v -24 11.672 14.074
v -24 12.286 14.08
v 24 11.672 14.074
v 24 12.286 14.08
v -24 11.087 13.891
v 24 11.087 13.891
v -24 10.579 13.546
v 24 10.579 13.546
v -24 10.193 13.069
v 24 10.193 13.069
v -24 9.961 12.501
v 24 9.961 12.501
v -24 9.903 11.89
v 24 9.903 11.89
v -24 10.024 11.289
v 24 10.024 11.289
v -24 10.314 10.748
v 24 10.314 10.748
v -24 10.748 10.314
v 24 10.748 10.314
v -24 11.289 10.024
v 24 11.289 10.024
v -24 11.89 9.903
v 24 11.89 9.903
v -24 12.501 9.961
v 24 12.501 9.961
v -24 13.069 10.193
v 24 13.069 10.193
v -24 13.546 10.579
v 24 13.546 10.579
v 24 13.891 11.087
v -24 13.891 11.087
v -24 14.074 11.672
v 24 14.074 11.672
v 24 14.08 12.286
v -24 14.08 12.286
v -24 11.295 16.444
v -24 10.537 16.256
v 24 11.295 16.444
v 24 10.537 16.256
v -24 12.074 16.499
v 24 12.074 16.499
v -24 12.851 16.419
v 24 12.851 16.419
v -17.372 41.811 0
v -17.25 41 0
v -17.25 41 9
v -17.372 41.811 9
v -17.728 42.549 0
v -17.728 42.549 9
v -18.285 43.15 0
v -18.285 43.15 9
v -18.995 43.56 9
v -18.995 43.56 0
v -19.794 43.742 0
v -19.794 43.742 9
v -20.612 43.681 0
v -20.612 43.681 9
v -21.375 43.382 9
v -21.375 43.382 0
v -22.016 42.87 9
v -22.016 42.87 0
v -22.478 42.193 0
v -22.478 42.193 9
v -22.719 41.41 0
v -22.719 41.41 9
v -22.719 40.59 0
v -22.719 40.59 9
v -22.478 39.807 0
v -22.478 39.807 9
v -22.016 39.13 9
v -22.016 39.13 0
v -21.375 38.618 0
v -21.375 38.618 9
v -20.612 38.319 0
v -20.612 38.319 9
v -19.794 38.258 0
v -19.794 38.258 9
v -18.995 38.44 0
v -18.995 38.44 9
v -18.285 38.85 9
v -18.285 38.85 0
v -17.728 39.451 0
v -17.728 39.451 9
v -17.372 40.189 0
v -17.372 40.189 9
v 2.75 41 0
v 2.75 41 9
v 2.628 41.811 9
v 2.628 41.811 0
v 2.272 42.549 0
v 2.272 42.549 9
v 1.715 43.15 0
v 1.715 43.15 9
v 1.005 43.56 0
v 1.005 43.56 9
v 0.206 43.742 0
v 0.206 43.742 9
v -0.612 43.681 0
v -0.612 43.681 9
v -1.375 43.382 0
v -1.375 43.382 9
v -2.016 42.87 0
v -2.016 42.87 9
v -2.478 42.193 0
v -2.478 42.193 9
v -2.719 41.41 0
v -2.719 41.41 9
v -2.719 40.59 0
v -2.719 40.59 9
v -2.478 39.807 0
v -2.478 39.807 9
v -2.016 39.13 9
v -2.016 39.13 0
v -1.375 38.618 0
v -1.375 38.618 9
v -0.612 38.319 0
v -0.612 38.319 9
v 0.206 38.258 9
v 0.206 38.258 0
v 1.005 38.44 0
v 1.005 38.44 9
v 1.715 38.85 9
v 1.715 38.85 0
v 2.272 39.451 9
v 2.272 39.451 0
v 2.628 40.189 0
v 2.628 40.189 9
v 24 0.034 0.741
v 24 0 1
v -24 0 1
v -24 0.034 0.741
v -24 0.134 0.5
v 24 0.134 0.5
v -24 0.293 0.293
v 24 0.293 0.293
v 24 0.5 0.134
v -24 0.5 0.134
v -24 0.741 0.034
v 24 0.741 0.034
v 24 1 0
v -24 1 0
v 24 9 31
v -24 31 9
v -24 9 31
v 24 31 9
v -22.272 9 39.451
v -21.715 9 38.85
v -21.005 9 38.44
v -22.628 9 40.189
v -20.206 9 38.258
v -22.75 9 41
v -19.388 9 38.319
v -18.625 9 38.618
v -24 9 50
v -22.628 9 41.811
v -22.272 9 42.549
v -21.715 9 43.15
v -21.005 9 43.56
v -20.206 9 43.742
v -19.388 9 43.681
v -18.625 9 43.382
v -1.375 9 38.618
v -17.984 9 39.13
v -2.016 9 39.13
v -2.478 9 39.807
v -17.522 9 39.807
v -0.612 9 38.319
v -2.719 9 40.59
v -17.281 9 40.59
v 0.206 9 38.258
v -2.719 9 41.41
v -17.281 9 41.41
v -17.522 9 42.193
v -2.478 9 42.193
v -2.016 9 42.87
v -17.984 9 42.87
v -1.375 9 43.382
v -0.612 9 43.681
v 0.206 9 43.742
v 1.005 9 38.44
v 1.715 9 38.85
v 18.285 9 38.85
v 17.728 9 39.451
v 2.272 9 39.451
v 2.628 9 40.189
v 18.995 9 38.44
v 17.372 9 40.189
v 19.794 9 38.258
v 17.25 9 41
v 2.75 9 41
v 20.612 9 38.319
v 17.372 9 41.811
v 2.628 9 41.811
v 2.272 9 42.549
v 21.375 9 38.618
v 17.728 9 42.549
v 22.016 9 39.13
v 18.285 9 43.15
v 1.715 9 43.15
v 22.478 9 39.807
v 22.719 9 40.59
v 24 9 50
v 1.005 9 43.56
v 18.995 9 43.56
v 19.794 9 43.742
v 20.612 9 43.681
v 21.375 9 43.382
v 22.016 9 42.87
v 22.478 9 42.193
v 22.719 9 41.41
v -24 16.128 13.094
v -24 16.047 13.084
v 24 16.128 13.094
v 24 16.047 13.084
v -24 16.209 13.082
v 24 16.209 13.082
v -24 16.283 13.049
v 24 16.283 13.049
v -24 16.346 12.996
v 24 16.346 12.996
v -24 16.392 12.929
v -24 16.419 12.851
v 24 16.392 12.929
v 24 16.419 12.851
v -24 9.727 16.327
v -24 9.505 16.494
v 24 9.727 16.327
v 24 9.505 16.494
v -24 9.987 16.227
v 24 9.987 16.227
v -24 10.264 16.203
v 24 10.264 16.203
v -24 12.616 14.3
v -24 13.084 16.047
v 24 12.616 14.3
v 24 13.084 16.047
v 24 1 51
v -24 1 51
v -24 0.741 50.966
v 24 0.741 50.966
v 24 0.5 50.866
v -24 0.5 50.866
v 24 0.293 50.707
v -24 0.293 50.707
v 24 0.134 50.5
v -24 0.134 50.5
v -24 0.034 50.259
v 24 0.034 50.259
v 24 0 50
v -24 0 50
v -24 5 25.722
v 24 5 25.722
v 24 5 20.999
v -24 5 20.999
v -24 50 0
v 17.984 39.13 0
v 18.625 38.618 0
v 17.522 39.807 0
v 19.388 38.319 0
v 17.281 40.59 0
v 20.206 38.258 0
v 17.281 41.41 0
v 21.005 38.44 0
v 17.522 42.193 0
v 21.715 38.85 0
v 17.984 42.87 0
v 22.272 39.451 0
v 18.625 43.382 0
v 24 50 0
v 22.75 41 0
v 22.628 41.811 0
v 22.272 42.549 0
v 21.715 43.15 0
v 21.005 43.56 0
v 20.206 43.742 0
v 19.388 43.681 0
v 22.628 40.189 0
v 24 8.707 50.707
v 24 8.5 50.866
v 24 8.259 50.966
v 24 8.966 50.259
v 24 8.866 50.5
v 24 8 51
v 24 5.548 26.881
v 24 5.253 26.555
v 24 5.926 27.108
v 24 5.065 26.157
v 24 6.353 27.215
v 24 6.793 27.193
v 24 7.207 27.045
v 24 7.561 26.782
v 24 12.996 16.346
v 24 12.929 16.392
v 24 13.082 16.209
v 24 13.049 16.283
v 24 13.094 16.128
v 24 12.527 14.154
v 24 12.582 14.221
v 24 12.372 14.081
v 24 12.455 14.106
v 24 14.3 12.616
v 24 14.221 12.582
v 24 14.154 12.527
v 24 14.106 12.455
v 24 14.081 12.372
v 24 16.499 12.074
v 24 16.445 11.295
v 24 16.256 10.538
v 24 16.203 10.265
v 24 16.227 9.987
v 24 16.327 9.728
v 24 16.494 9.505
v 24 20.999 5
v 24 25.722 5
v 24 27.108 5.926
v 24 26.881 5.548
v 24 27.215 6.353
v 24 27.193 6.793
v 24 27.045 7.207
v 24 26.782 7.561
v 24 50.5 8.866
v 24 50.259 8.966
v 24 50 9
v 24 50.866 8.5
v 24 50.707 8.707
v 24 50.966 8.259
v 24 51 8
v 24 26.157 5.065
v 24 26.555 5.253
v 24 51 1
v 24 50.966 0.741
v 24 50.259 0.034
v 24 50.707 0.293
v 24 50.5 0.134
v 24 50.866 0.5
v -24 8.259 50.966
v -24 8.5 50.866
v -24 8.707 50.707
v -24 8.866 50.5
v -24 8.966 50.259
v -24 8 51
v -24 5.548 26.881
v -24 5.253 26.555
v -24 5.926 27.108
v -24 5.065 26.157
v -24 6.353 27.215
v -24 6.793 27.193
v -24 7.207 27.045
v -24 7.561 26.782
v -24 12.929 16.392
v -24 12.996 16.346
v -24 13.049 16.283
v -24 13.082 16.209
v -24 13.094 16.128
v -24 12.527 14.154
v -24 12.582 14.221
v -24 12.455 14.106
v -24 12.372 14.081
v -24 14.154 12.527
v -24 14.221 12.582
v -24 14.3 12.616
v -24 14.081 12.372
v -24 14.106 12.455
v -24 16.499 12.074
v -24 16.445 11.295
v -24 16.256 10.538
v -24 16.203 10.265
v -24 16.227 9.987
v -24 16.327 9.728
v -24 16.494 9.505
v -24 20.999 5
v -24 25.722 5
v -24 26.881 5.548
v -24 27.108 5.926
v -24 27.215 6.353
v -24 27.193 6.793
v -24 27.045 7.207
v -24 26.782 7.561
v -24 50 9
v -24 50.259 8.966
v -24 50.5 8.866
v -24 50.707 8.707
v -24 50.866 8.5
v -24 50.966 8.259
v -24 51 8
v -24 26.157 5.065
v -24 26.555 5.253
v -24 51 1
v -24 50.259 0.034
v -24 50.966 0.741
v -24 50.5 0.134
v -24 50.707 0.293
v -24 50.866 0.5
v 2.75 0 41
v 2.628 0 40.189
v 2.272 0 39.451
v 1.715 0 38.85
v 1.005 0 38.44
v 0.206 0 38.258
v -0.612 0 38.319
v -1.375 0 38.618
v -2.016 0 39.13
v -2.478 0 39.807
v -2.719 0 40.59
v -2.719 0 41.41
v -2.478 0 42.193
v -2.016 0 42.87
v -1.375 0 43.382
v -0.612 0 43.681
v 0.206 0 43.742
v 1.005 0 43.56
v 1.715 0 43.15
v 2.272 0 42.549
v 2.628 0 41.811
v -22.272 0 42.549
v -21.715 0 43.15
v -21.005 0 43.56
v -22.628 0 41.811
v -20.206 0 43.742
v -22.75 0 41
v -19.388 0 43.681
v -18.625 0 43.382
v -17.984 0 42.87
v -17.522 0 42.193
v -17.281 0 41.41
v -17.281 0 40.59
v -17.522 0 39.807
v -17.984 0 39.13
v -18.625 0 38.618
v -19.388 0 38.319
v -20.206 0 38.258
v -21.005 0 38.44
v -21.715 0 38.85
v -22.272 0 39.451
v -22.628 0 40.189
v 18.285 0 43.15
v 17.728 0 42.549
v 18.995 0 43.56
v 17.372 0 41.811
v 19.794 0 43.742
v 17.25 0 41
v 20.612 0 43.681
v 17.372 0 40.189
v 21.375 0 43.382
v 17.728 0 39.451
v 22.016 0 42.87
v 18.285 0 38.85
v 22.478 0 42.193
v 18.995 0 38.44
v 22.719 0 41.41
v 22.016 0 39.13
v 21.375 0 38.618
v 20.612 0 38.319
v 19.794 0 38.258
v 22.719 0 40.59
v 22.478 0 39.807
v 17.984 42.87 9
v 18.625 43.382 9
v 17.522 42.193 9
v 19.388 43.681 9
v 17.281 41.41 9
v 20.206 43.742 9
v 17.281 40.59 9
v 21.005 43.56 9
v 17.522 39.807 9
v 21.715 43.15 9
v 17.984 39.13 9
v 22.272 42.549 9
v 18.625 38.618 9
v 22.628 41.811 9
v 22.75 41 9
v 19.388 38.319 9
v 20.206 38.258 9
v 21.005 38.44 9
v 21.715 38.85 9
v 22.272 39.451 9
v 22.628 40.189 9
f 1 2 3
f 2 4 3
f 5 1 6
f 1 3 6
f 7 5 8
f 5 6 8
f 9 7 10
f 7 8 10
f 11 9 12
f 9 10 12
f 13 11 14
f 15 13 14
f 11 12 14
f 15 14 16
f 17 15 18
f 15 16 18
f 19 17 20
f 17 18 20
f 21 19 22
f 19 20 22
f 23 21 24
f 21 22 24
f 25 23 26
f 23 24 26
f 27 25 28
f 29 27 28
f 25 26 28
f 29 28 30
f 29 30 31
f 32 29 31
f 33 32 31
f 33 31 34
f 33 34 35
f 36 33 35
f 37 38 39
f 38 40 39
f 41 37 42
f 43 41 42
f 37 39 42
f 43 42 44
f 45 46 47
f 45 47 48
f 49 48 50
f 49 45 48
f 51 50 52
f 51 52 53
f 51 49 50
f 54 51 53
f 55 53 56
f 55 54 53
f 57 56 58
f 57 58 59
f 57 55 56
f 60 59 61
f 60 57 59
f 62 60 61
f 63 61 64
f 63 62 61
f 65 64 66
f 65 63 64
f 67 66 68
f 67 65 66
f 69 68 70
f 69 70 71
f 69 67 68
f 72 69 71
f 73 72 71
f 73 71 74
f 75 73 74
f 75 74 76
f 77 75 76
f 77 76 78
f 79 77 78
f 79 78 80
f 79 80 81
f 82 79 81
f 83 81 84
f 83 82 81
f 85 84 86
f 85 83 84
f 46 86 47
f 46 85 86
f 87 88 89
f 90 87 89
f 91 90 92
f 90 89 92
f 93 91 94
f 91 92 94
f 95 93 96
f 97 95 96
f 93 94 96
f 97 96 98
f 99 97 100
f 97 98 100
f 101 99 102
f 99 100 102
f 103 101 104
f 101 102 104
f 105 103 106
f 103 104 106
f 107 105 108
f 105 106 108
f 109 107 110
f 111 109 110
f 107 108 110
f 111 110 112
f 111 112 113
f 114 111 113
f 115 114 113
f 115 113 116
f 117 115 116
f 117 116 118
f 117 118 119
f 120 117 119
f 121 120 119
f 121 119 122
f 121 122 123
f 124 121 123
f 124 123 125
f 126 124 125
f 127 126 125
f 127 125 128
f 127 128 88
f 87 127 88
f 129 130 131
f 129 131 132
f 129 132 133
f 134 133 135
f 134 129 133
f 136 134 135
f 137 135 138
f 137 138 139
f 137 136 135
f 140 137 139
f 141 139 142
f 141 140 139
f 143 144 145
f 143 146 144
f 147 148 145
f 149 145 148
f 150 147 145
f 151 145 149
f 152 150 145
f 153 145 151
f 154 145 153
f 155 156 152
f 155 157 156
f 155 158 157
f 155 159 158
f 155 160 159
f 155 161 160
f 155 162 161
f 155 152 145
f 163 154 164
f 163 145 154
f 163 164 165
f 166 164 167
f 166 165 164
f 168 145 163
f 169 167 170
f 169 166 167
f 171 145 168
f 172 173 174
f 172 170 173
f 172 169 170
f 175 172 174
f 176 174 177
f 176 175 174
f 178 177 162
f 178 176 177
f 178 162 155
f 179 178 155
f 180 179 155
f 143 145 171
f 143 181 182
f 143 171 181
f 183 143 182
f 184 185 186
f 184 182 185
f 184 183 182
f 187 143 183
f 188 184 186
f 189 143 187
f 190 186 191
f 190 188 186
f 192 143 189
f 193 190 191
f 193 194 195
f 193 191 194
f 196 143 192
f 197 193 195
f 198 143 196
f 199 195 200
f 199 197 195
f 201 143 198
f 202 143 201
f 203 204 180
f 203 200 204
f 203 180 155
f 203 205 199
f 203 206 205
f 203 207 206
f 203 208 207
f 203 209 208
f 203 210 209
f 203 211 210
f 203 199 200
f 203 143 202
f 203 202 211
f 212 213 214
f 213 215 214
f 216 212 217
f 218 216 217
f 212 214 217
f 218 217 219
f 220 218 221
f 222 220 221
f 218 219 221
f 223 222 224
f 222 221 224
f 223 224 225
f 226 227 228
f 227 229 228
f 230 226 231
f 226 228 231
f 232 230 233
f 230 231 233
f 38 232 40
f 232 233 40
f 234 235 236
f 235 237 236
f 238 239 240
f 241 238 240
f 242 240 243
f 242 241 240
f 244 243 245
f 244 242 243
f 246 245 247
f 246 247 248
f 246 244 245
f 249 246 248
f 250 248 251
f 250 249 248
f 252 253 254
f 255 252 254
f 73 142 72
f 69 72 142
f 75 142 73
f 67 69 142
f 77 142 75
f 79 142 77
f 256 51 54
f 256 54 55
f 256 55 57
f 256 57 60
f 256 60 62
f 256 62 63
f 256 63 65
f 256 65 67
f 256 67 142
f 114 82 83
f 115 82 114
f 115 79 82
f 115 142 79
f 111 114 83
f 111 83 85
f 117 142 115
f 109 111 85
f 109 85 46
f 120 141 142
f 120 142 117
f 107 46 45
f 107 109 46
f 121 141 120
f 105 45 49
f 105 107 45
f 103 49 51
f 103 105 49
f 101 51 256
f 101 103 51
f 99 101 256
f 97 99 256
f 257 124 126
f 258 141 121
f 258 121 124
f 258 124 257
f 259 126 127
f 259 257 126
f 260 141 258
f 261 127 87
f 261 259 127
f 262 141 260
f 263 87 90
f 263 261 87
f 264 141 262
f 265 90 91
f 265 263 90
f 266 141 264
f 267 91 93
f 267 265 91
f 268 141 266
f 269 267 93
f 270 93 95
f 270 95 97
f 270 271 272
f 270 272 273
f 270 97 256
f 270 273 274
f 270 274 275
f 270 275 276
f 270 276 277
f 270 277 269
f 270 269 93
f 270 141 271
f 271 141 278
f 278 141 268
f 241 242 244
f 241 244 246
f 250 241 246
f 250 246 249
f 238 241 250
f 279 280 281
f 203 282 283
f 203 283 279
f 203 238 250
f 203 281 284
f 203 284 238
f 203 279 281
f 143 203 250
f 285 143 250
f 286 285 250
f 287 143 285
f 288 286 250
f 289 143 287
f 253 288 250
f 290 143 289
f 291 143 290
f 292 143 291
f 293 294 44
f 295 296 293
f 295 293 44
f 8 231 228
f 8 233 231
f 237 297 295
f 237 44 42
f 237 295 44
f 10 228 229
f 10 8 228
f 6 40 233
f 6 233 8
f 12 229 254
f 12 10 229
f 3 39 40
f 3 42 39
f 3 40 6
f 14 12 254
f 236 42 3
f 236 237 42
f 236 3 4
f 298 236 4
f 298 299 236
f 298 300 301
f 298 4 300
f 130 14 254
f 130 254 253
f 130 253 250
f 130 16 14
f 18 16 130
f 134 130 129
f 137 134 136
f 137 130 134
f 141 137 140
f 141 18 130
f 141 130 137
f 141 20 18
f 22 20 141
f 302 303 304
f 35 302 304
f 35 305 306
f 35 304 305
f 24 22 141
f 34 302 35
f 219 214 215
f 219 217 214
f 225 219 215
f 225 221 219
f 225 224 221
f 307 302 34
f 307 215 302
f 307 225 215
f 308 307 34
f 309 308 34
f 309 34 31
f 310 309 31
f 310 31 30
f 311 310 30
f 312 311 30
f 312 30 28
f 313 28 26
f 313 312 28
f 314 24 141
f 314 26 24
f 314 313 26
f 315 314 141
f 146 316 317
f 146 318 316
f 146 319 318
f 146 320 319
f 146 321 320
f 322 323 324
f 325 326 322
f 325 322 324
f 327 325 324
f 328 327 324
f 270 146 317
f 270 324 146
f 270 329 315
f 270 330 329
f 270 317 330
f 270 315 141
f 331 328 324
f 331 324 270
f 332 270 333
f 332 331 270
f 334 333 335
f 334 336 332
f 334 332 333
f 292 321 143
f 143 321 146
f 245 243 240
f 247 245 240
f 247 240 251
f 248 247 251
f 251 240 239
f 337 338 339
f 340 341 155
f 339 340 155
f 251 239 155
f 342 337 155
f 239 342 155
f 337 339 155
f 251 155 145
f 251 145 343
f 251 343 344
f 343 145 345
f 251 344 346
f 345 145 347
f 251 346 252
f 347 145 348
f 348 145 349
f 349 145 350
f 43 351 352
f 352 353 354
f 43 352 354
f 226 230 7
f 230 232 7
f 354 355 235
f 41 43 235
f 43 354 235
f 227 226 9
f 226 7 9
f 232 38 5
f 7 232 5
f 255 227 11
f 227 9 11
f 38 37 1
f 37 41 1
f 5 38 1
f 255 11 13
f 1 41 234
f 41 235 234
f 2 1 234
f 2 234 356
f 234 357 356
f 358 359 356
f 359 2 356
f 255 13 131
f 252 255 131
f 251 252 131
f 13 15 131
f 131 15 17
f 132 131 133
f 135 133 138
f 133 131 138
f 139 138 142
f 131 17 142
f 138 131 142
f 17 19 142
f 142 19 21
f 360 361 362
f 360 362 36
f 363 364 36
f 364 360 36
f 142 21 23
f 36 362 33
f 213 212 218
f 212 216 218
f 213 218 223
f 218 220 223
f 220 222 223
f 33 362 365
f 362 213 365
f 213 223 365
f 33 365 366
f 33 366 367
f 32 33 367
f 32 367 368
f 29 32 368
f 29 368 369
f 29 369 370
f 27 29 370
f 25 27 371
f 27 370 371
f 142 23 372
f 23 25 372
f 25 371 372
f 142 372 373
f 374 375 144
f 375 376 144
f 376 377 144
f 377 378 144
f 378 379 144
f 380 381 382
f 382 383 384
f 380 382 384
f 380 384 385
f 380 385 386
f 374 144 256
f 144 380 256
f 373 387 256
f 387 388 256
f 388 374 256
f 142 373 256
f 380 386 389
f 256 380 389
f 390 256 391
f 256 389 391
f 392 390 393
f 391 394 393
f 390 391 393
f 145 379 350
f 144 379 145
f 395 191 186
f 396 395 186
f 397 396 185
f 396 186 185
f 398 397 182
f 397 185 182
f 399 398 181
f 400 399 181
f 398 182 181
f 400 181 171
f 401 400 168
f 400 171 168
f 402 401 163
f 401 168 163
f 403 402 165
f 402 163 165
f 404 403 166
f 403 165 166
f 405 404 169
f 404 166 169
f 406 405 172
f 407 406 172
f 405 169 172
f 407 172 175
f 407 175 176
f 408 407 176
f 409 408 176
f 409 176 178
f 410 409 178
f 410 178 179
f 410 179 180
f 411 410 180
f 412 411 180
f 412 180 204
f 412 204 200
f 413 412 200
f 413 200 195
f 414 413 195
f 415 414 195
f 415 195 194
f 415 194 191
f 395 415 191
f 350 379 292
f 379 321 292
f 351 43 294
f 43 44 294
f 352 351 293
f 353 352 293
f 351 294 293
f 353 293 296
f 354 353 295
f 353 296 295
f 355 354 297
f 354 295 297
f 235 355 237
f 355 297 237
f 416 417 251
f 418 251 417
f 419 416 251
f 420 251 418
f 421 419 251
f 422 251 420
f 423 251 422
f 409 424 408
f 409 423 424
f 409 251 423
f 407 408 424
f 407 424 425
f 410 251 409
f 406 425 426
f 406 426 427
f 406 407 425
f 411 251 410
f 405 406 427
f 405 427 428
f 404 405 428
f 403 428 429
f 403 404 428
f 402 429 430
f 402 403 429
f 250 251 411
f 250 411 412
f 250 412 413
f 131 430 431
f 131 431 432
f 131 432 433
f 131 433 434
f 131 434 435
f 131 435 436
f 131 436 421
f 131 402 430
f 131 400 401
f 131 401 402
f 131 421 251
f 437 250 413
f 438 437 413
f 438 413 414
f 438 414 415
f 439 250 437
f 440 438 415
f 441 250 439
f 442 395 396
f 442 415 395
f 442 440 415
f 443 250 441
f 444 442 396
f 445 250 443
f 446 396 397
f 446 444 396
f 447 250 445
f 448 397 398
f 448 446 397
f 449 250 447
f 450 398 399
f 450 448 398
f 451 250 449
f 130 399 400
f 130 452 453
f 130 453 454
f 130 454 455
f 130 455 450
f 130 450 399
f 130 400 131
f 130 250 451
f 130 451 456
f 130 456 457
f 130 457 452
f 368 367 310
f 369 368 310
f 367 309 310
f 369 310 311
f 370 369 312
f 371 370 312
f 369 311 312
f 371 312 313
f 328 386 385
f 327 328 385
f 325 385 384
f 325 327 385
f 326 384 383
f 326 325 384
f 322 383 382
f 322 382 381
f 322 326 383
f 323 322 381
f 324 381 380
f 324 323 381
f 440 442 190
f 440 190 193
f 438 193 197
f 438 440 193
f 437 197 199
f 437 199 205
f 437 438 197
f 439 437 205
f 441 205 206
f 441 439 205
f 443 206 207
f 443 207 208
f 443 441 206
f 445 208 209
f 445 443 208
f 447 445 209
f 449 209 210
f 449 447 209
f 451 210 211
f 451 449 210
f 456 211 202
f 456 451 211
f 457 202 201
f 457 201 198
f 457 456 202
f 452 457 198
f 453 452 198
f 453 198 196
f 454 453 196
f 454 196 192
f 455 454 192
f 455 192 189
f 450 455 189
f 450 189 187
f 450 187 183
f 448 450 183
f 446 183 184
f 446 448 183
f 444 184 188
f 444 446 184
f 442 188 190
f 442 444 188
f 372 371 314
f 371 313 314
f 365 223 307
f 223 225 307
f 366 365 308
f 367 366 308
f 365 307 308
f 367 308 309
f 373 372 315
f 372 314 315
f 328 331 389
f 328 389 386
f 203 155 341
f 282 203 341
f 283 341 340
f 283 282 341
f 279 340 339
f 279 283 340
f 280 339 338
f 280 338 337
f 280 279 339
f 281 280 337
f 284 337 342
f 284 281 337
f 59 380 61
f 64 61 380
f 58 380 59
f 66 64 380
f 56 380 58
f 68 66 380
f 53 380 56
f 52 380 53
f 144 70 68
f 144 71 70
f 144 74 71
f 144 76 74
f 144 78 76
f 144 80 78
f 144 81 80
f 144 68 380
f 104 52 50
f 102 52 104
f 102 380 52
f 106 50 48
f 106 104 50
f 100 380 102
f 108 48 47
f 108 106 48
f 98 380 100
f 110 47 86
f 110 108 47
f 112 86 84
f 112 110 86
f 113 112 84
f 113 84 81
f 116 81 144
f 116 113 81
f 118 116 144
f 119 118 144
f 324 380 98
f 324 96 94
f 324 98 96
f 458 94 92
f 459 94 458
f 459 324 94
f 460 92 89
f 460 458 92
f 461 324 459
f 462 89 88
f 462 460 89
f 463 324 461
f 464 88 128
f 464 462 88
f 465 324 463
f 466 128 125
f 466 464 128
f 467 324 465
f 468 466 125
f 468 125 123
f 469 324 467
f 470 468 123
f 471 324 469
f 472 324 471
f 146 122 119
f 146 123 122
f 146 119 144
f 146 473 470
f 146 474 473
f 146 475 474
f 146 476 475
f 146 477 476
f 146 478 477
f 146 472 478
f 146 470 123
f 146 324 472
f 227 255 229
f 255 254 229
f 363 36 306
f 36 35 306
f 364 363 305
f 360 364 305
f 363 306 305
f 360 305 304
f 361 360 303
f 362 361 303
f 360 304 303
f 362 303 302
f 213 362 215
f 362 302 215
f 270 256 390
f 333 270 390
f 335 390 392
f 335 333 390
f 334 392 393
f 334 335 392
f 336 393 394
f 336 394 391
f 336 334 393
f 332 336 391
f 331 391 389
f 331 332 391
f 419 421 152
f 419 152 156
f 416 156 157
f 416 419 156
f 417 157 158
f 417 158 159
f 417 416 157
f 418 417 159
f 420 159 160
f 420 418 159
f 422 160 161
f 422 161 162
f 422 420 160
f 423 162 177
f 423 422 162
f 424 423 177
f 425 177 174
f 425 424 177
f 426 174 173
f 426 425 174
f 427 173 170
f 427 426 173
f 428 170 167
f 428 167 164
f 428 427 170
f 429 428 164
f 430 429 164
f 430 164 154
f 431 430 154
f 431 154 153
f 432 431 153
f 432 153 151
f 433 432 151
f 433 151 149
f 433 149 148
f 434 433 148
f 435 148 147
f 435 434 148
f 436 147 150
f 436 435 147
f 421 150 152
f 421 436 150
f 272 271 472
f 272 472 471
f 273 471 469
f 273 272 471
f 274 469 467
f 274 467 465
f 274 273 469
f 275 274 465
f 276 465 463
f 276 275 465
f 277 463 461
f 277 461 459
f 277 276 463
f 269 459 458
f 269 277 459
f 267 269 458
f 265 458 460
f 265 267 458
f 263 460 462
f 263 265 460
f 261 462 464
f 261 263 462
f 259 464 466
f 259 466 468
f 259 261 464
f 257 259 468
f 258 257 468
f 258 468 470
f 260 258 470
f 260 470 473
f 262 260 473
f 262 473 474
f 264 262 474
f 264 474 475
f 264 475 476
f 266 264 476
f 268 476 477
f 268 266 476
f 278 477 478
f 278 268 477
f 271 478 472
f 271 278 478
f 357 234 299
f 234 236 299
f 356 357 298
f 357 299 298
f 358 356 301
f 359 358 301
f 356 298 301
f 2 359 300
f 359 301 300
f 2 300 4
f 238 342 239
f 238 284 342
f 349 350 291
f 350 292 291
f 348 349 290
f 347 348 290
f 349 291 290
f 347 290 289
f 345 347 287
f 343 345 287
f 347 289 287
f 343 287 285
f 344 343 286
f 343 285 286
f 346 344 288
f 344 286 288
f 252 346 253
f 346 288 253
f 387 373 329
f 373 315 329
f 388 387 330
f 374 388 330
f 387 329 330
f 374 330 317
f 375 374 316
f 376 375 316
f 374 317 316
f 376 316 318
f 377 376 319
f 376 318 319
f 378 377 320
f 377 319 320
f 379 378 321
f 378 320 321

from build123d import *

# Parameters (mm, degrees)
BOSS_EXTRUDE1_DEPTH      = 24
BOSS_EXTRUDE1_DEPTH_BACK = 24
SKETCH2_R                = 2.75
CUT_EXTRUDE1_DEPTH       = 9
SKETCH3_R                = 2.75
CUT_EXTRUDE2_DEPTH       = 9
SKETCH4_R                = 2.75
CUT_EXTRUDE3_DEPTH       = 9
SKETCH5_R                = 2.75
CUT_EXTRUDE4_DEPTH       = 9
SKETCH6_R                = 2.75
CUT_EXTRUDE5_DEPTH       = 10
SKETCH7_R                = 2.75
CUT_EXTRUDE6_DEPTH       = 10


with BuildPart() as part:
    # Sketch1 → Boss-Extrude1 (new, two sides: drawn at the far end of the back side and taken through both)
    with BuildSketch(Plane(origin=(0, 0, 0), x_dir=(0, 0, -1), z_dir=(1, 0, 0)).offset(-BOSS_EXTRUDE1_DEPTH_BACK)):
        with BuildLine():
            Line((-50, 0), (-1, 0))
            ThreePointArc((-1, 0), (-0.292893219, 0.292893219), (0, 1))
            Line((0, 1), (0, 50))
            ThreePointArc((0, 50), (-0.292893219, 50.707106781), (-1, 51))
            Line((-1, 51), (-8, 51))
            ThreePointArc((-8, 51), (-8.707106781, 50.707106781), (-9, 50))
            Line((-9, 50), (-9, 31))
            Line((-9, 31), (-31, 9))
            Line((-31, 9), (-50, 9))
            ThreePointArc((-50, 9), (-50.707106781, 8.707106781), (-51, 8))
            Line((-51, 8), (-51, 1))
            ThreePointArc((-51, 1), (-50.707106781, 0.292893219), (-50, 0))
        make_face()
        with BuildLine():
            Line((-25.721825407, 5), (-20.999285733, 5))
            Line((-20.999285733, 5), (-16.494036438, 9.505249294))
            ThreePointArc((-16.494036438, 9.505249294), (-16.226979866, 9.987090789), (-16.255625497, 10.537245192))
            ThreePointArc((-16.255625497, 10.537245192), (-16.488859314, 11.683547702), (-16.418755424, 12.851234691))
            ThreePointArc((-16.418755424, 12.851234691), (-16.283360667, 13.048766752), (-16.046526031, 13.084263382))
            Line((-16.046526031, 13.084263382), (-14.300039569, 12.616293745))
            ThreePointArc((-14.300039569, 12.616293745), (-14.127781033, 12.492491496), (-14.080474622, 12.285701498))
            ThreePointArc((-14.080474622, 12.285701498), (-10.515075745, 10.515075774), (-12.285701539, 14.080474617))
            ThreePointArc((-12.285701539, 14.080474617), (-12.492491514, 14.127781045), (-12.616293745, 14.300039569))
            Line((-12.616293745, 14.300039569), (-13.084263382, 16.046526031))
            ThreePointArc((-13.084263382, 16.046526031), (-13.048766728, 16.283360705), (-12.851234602, 16.418755442))
            ThreePointArc((-12.851234602, 16.418755442), (-11.683774102, 16.488875269), (-10.537674556, 16.255773055))
            ThreePointArc((-10.537674556, 16.255773055), (-9.987311976, 16.226928716), (-9.505249294, 16.494036438))
            Line((-9.505249294, 16.494036438), (-5, 20.999285733))
            Line((-5, 20.999285733), (-5, 25.721825407))
            ThreePointArc((-5, 25.721825407), (-5.925974851, 27.107644706), (-7.560660172, 26.782485579))
            Line((-7.560660172, 26.782485579), (-26.782485579, 7.560660172))
            ThreePointArc((-26.782485579, 7.560660172), (-27.107644706, 5.925974851), (-25.721825407, 5))
        make_face(mode=Mode.SUBTRACT)
    extrude(amount=BOSS_EXTRUDE1_DEPTH + BOSS_EXTRUDE1_DEPTH_BACK)

    # Sketch2 → Cut-Extrude1 (cut)
    with BuildSketch(Plane(origin=(0, 0, 0), x_dir=(-1, 0, 0), z_dir=(0, 1, 0))):
        with Locations((20, 41)):
            Circle(SKETCH2_R)
    extrude(amount=CUT_EXTRUDE1_DEPTH, mode=Mode.SUBTRACT)

    # Sketch3 → Cut-Extrude2 (cut)
    with BuildSketch(Plane(origin=(0, 0, 0), x_dir=(-1, 0, 0), z_dir=(0, 1, 0))):
        with Locations((-20, 41)):
            Circle(SKETCH3_R)
    extrude(amount=CUT_EXTRUDE2_DEPTH, mode=Mode.SUBTRACT)

    # Sketch4 → Cut-Extrude3 (cut)
    with BuildSketch(Plane.XY):
        with Locations((-20, 41)):
            Circle(SKETCH4_R)
    extrude(amount=CUT_EXTRUDE3_DEPTH, mode=Mode.SUBTRACT)

    # Sketch5 → Cut-Extrude4 (cut)
    with BuildSketch(Plane.XY):
        with Locations((20, 41)):
            Circle(SKETCH5_R)
    extrude(amount=CUT_EXTRUDE4_DEPTH, mode=Mode.SUBTRACT)

    # Sketch6 → Cut-Extrude5 (cut)
    with BuildSketch(Plane(origin=(0, 9, 0), x_dir=(1, 0, 0), z_dir=(0, 1, 0))):
        with Locations((0, -41)):
            Circle(SKETCH6_R)
    extrude(amount=-CUT_EXTRUDE5_DEPTH, mode=Mode.SUBTRACT)

    # Sketch7 → Cut-Extrude6 (cut)
    with BuildSketch(Plane.XY.offset(9)):
        with Locations((0, 41)):
            Circle(SKETCH7_R)
    extrude(amount=-CUT_EXTRUDE6_DEPTH, mode=Mode.SUBTRACT)


solid = part.part
